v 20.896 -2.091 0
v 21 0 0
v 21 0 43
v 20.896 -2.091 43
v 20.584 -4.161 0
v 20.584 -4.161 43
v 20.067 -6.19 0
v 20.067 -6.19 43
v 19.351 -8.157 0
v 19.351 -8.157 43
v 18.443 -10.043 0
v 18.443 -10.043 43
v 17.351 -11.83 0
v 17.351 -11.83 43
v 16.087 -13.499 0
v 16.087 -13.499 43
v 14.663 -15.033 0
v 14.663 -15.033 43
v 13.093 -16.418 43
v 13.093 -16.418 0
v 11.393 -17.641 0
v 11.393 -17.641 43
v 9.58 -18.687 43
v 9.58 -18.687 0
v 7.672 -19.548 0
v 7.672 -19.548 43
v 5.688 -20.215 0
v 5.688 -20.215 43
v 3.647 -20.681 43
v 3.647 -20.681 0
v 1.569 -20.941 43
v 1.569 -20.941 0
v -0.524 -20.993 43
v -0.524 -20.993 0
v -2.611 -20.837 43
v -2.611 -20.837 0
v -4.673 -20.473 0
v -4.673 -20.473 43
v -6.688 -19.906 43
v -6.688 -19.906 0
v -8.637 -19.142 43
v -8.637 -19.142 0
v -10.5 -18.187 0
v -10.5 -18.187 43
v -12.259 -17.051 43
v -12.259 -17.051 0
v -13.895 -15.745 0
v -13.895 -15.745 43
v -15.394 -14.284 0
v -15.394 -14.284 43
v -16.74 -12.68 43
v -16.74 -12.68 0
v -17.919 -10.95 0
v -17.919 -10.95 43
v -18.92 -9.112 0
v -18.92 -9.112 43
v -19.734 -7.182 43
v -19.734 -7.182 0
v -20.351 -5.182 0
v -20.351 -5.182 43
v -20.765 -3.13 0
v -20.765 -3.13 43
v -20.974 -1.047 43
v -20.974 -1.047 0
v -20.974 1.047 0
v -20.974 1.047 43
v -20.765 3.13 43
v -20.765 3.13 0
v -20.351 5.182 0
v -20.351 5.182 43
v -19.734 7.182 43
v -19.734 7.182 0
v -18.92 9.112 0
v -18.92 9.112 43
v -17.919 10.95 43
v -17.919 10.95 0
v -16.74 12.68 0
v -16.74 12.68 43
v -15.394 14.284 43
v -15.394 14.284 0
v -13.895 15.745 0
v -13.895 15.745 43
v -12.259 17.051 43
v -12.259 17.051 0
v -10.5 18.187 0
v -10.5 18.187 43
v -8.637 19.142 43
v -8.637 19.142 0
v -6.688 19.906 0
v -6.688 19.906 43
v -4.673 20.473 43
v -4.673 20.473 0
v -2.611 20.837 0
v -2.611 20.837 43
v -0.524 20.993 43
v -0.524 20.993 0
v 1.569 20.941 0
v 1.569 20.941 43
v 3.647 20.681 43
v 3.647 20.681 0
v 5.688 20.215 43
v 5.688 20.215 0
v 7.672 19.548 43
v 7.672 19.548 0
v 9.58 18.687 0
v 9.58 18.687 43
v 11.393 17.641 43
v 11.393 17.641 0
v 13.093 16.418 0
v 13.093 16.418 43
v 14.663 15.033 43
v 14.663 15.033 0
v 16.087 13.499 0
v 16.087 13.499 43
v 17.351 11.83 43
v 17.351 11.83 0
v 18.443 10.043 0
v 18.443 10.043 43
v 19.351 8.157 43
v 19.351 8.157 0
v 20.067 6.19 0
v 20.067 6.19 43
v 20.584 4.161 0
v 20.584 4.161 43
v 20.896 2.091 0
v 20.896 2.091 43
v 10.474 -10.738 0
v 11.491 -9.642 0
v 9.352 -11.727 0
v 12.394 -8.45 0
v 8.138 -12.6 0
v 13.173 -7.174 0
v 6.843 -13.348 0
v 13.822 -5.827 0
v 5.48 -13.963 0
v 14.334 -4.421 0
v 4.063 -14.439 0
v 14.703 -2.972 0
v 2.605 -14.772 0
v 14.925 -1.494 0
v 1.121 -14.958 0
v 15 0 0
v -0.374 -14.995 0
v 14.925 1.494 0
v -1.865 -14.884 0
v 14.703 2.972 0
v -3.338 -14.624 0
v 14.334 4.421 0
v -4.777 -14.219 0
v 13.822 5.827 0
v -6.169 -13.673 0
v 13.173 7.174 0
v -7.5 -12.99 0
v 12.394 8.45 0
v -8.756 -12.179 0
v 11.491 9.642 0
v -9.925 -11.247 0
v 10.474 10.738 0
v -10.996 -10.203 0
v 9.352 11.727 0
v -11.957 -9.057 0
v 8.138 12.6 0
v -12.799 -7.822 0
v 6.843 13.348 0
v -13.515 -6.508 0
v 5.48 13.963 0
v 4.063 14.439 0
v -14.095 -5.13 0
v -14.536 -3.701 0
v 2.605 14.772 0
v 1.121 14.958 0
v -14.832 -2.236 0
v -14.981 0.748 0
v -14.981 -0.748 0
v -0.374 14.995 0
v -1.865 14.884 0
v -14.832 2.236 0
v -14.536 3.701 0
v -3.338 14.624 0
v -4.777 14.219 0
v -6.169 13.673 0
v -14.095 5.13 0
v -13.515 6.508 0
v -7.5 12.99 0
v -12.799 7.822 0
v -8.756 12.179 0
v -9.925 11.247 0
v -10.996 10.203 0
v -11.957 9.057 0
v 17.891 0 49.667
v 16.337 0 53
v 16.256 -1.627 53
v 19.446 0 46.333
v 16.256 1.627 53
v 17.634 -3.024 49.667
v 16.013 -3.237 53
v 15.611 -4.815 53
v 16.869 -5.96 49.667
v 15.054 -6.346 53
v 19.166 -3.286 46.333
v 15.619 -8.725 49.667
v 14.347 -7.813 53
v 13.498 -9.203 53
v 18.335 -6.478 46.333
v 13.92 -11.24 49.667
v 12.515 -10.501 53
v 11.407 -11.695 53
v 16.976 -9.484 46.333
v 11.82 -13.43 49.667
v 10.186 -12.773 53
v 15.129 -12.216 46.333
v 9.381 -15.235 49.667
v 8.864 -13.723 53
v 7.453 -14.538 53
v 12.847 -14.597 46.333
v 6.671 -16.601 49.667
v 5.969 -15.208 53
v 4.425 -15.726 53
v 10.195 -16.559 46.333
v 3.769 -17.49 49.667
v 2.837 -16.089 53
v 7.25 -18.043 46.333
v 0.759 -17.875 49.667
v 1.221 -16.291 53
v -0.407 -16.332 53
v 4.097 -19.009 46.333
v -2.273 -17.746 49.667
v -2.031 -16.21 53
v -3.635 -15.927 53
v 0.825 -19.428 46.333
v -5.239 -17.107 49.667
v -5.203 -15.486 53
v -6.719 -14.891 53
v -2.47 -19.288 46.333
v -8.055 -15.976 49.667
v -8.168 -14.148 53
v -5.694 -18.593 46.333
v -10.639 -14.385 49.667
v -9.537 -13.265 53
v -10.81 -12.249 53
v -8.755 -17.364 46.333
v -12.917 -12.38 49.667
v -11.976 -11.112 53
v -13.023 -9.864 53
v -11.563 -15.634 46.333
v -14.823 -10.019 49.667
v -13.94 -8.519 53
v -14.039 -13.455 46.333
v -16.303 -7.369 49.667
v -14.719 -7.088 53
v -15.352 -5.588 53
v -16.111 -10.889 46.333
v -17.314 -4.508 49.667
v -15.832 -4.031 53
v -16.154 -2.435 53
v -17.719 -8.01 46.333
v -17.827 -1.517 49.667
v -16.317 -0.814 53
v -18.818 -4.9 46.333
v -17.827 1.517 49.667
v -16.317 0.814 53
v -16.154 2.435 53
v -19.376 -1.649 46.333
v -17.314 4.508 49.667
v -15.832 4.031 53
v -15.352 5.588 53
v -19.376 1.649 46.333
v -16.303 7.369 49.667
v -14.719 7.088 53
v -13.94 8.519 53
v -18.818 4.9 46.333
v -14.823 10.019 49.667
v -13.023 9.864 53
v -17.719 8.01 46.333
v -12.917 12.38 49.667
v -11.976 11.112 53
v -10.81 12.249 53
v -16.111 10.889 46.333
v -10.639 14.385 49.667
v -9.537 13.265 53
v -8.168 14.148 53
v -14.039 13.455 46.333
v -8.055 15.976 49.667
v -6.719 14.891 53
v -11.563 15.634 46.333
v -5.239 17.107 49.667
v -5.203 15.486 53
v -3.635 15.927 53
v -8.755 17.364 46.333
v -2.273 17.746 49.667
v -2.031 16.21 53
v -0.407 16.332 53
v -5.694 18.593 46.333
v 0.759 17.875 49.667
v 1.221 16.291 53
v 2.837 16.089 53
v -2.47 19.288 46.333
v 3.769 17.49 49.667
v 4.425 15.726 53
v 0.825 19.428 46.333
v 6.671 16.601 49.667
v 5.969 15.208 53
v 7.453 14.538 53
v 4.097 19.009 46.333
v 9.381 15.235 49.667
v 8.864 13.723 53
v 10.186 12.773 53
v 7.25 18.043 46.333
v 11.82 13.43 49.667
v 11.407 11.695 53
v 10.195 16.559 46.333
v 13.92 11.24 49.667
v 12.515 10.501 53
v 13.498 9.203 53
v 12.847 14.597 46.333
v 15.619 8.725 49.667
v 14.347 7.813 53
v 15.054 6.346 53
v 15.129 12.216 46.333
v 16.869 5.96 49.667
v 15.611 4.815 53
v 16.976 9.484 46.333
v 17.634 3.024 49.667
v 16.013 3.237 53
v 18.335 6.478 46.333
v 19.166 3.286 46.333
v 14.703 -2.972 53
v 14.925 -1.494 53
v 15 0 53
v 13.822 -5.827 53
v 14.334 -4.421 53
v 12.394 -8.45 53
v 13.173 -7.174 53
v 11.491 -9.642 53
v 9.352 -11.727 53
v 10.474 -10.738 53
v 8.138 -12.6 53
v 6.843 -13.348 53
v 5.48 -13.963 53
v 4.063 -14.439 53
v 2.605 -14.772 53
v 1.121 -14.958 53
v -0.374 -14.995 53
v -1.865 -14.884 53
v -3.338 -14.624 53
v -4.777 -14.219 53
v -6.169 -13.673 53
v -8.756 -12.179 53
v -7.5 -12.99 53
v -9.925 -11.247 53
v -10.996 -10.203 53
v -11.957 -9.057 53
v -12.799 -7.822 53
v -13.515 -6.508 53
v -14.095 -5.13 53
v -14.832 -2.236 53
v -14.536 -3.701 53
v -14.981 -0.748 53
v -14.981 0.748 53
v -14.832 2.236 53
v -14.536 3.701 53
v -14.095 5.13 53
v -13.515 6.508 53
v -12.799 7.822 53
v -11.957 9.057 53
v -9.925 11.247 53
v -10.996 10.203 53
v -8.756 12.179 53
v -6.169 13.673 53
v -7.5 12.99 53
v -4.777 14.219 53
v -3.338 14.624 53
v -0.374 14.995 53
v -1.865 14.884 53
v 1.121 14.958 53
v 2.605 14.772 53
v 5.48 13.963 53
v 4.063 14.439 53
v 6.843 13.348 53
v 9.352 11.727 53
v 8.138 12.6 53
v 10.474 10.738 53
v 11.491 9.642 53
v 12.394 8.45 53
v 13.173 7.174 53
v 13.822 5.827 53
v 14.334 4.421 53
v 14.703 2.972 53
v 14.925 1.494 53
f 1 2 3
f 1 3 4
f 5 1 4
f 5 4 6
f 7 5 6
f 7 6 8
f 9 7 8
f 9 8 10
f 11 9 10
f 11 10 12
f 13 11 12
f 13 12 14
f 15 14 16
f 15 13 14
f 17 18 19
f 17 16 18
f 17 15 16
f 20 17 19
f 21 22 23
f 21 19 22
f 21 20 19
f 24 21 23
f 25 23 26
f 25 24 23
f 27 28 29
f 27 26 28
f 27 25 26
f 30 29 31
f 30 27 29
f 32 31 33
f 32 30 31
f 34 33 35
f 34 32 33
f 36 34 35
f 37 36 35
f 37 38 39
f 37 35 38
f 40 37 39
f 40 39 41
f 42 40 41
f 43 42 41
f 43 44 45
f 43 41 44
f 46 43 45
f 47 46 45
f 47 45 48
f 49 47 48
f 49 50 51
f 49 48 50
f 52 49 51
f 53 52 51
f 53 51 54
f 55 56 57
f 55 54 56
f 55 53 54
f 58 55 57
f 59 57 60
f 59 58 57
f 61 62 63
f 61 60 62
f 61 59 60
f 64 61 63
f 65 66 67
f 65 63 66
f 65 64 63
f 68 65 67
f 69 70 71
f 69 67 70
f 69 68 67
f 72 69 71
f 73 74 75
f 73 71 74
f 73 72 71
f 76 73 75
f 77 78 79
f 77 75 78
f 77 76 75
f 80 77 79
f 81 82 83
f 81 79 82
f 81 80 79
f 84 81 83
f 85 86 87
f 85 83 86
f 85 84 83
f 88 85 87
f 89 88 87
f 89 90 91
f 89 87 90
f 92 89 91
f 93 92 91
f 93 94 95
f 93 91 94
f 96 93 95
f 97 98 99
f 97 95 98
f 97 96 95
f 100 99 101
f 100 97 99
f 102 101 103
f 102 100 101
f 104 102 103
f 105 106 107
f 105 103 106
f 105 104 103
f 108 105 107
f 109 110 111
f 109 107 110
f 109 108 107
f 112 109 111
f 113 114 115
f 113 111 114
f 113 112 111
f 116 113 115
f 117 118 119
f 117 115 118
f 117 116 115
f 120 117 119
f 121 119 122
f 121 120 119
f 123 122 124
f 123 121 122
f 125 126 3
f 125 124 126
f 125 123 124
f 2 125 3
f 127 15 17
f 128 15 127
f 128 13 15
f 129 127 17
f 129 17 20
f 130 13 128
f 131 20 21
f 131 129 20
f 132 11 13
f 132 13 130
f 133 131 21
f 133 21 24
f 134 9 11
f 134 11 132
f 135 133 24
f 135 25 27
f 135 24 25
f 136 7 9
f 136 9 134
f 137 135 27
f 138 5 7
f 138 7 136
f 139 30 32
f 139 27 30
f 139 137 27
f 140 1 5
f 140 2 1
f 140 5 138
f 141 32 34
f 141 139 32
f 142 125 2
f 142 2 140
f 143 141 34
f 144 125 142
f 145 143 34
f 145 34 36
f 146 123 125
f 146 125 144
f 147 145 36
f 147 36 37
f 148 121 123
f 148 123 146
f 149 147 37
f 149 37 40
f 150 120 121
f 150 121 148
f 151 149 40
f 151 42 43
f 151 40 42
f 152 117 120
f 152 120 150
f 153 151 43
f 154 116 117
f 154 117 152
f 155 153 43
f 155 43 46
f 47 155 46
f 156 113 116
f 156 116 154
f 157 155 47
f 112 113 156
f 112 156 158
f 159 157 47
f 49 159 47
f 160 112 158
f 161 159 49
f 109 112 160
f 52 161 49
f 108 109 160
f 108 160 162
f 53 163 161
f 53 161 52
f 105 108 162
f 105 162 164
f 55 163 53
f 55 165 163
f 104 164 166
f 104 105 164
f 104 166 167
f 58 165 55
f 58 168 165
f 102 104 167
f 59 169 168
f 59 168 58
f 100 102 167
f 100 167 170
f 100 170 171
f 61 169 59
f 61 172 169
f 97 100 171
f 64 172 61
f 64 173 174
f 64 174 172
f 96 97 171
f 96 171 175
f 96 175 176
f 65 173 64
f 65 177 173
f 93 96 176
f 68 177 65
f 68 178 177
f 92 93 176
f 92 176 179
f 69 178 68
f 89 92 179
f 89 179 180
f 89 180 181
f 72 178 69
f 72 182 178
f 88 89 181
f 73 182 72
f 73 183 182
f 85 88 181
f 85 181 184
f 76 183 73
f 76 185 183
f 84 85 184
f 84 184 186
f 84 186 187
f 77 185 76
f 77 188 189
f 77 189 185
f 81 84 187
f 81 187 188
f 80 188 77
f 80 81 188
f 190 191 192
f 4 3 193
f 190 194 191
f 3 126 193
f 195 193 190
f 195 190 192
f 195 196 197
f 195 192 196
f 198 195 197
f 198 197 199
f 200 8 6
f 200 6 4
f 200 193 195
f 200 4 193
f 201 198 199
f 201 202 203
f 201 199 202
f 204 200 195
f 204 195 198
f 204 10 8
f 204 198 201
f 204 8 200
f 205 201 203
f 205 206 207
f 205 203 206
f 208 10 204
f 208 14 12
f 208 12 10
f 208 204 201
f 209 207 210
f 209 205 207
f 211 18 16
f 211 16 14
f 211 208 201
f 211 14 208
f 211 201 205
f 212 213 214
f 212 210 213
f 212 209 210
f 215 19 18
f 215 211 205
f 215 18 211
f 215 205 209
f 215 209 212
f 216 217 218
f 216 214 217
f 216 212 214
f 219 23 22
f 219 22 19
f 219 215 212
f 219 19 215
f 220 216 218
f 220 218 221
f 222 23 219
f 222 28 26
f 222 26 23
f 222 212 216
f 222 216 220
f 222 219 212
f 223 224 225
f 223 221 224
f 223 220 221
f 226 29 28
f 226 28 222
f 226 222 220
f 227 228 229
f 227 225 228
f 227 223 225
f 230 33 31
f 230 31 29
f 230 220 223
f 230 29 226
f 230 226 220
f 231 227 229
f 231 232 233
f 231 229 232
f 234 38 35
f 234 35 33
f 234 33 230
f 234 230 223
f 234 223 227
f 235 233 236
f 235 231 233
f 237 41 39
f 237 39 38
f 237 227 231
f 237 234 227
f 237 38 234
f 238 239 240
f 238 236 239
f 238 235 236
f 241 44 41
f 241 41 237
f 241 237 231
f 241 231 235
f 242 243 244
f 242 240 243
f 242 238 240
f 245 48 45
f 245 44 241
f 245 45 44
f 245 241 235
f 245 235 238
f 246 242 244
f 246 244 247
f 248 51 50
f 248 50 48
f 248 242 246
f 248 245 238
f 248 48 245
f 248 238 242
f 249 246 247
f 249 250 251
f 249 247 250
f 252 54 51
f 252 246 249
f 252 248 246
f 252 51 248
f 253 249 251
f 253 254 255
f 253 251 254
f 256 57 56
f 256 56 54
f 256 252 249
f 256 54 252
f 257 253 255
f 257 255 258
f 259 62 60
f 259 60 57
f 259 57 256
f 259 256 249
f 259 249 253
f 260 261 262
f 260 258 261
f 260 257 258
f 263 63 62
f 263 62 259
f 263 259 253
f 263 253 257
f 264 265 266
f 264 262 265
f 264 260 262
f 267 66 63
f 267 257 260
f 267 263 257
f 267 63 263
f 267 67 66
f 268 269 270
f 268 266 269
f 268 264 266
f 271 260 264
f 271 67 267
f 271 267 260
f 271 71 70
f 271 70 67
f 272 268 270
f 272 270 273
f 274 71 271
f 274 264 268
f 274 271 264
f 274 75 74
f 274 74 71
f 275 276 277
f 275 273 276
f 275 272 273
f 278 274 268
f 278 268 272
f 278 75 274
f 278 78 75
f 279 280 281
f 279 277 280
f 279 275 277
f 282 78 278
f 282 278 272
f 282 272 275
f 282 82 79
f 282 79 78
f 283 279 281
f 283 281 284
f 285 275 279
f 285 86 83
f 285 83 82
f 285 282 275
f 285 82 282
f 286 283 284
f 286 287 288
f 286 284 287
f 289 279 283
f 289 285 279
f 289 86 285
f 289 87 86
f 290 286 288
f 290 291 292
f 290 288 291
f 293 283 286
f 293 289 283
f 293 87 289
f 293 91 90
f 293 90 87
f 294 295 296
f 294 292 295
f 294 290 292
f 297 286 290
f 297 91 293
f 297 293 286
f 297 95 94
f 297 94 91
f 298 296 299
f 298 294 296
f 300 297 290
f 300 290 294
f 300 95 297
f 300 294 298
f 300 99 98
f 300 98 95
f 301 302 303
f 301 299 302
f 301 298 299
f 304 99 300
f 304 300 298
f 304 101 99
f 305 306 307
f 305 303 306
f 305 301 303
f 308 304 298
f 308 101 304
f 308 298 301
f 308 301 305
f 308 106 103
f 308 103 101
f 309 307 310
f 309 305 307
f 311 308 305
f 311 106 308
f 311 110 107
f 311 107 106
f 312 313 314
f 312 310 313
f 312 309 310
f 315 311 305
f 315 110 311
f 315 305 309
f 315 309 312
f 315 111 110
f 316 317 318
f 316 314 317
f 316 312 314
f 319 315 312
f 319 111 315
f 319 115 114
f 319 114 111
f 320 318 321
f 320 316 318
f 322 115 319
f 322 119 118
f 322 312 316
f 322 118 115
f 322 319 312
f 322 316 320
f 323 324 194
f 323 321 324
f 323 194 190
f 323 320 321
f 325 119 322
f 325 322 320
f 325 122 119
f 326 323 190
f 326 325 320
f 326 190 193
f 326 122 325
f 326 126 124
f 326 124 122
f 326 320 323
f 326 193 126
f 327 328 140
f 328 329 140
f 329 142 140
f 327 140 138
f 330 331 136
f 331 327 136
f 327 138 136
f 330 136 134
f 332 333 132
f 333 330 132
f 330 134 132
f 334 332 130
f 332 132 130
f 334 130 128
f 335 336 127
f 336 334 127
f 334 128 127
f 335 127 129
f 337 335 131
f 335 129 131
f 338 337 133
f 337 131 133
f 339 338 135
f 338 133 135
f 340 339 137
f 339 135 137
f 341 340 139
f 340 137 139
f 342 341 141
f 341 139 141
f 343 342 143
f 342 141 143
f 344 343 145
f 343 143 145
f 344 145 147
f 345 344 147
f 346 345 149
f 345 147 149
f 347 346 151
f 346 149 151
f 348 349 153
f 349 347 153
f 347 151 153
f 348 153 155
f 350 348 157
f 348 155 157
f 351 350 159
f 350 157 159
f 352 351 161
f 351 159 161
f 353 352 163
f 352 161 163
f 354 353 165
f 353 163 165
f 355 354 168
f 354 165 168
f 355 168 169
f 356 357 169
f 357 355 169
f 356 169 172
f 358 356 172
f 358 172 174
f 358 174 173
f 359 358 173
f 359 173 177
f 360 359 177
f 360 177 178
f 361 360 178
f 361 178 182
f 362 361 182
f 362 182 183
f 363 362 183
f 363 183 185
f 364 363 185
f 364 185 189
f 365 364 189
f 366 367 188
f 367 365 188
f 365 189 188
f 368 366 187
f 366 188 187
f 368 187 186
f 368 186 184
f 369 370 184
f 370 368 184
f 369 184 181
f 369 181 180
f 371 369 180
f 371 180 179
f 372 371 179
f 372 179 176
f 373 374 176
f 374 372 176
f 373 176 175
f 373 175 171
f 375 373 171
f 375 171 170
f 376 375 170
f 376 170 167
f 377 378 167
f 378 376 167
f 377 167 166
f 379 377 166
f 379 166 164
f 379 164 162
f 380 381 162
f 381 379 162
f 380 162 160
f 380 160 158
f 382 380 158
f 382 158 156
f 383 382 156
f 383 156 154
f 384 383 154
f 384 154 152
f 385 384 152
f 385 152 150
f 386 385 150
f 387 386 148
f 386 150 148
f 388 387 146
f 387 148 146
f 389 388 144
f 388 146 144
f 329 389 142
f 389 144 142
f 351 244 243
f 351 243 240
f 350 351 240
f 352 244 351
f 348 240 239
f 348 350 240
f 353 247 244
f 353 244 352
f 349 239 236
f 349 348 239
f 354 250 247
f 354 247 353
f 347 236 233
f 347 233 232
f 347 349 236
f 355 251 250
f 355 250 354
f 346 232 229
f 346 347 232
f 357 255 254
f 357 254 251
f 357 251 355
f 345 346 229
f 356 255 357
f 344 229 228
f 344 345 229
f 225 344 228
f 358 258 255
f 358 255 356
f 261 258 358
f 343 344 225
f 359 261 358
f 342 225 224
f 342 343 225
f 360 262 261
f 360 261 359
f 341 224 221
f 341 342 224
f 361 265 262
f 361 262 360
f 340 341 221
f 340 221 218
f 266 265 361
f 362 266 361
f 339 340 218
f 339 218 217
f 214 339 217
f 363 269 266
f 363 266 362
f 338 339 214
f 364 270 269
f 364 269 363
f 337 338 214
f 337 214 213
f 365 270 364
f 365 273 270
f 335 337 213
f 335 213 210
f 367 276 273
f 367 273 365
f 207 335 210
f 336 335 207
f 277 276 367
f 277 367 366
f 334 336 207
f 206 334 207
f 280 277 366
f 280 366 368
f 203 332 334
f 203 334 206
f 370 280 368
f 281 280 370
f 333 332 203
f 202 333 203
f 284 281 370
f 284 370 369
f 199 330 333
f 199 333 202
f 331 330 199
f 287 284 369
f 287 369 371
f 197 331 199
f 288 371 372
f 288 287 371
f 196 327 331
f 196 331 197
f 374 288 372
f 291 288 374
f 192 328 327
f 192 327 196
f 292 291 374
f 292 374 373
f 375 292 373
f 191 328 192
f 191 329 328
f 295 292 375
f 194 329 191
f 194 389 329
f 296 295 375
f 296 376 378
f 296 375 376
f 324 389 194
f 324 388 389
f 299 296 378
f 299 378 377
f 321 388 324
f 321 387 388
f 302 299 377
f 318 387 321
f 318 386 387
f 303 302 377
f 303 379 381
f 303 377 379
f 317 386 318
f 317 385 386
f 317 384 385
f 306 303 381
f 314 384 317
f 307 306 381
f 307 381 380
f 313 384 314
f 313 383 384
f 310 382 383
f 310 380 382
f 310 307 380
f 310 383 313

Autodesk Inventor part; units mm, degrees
ref_plane "YZ Plane" through (0, 0, 0) normal (1, 0, 0) x (0, 1, 0)
ref_plane "XZ Plane" through (0, 0, 0) normal (0, 1, 0) x (-1, 0, 0)
ref_plane "XY Plane" through (0, 0, 0) normal (0, 0, 1) x (1, 0, 0)
sketch "Sketch1" plane through (0, 0, 0) normal (0, 0, 1) x (1, 0, 0)
  circle A0 centre (0, 0) radius 15
  circle A1 centre (0, 0) radius 21
  dimension "d0" = 30
  dimension "d1" = 42
extrude "Extrusion1" add sketch "Sketch1" along normal blind 53
sketch "Sketch2" plane through (0, 0, 0) normal (0, 0, -1) x (-1, 0, 0)
  circle A0 centre (0, 0) radius 17.5
  circle A1 centre (0, 0) radius 21
  dimension "d4" = 35
  dimension "d5" = 42
extrude "Extrusion2" add sketch "Sketch2" along normal blind 5
chamfer "Chamfer2" distance 10 angle 25 1 edges at (-21, 0, 53) measured on face at (20.9319, -1.6898, 35.3333)
thicken "Thicken1" operation add thickness 5 both sides no extend neighbours yes toward (0, 0, 1) faces at (-19.4604, -3.0712, -5)
properties part number "Nikon-Objective-Insulation" material "ABS Plastic"
